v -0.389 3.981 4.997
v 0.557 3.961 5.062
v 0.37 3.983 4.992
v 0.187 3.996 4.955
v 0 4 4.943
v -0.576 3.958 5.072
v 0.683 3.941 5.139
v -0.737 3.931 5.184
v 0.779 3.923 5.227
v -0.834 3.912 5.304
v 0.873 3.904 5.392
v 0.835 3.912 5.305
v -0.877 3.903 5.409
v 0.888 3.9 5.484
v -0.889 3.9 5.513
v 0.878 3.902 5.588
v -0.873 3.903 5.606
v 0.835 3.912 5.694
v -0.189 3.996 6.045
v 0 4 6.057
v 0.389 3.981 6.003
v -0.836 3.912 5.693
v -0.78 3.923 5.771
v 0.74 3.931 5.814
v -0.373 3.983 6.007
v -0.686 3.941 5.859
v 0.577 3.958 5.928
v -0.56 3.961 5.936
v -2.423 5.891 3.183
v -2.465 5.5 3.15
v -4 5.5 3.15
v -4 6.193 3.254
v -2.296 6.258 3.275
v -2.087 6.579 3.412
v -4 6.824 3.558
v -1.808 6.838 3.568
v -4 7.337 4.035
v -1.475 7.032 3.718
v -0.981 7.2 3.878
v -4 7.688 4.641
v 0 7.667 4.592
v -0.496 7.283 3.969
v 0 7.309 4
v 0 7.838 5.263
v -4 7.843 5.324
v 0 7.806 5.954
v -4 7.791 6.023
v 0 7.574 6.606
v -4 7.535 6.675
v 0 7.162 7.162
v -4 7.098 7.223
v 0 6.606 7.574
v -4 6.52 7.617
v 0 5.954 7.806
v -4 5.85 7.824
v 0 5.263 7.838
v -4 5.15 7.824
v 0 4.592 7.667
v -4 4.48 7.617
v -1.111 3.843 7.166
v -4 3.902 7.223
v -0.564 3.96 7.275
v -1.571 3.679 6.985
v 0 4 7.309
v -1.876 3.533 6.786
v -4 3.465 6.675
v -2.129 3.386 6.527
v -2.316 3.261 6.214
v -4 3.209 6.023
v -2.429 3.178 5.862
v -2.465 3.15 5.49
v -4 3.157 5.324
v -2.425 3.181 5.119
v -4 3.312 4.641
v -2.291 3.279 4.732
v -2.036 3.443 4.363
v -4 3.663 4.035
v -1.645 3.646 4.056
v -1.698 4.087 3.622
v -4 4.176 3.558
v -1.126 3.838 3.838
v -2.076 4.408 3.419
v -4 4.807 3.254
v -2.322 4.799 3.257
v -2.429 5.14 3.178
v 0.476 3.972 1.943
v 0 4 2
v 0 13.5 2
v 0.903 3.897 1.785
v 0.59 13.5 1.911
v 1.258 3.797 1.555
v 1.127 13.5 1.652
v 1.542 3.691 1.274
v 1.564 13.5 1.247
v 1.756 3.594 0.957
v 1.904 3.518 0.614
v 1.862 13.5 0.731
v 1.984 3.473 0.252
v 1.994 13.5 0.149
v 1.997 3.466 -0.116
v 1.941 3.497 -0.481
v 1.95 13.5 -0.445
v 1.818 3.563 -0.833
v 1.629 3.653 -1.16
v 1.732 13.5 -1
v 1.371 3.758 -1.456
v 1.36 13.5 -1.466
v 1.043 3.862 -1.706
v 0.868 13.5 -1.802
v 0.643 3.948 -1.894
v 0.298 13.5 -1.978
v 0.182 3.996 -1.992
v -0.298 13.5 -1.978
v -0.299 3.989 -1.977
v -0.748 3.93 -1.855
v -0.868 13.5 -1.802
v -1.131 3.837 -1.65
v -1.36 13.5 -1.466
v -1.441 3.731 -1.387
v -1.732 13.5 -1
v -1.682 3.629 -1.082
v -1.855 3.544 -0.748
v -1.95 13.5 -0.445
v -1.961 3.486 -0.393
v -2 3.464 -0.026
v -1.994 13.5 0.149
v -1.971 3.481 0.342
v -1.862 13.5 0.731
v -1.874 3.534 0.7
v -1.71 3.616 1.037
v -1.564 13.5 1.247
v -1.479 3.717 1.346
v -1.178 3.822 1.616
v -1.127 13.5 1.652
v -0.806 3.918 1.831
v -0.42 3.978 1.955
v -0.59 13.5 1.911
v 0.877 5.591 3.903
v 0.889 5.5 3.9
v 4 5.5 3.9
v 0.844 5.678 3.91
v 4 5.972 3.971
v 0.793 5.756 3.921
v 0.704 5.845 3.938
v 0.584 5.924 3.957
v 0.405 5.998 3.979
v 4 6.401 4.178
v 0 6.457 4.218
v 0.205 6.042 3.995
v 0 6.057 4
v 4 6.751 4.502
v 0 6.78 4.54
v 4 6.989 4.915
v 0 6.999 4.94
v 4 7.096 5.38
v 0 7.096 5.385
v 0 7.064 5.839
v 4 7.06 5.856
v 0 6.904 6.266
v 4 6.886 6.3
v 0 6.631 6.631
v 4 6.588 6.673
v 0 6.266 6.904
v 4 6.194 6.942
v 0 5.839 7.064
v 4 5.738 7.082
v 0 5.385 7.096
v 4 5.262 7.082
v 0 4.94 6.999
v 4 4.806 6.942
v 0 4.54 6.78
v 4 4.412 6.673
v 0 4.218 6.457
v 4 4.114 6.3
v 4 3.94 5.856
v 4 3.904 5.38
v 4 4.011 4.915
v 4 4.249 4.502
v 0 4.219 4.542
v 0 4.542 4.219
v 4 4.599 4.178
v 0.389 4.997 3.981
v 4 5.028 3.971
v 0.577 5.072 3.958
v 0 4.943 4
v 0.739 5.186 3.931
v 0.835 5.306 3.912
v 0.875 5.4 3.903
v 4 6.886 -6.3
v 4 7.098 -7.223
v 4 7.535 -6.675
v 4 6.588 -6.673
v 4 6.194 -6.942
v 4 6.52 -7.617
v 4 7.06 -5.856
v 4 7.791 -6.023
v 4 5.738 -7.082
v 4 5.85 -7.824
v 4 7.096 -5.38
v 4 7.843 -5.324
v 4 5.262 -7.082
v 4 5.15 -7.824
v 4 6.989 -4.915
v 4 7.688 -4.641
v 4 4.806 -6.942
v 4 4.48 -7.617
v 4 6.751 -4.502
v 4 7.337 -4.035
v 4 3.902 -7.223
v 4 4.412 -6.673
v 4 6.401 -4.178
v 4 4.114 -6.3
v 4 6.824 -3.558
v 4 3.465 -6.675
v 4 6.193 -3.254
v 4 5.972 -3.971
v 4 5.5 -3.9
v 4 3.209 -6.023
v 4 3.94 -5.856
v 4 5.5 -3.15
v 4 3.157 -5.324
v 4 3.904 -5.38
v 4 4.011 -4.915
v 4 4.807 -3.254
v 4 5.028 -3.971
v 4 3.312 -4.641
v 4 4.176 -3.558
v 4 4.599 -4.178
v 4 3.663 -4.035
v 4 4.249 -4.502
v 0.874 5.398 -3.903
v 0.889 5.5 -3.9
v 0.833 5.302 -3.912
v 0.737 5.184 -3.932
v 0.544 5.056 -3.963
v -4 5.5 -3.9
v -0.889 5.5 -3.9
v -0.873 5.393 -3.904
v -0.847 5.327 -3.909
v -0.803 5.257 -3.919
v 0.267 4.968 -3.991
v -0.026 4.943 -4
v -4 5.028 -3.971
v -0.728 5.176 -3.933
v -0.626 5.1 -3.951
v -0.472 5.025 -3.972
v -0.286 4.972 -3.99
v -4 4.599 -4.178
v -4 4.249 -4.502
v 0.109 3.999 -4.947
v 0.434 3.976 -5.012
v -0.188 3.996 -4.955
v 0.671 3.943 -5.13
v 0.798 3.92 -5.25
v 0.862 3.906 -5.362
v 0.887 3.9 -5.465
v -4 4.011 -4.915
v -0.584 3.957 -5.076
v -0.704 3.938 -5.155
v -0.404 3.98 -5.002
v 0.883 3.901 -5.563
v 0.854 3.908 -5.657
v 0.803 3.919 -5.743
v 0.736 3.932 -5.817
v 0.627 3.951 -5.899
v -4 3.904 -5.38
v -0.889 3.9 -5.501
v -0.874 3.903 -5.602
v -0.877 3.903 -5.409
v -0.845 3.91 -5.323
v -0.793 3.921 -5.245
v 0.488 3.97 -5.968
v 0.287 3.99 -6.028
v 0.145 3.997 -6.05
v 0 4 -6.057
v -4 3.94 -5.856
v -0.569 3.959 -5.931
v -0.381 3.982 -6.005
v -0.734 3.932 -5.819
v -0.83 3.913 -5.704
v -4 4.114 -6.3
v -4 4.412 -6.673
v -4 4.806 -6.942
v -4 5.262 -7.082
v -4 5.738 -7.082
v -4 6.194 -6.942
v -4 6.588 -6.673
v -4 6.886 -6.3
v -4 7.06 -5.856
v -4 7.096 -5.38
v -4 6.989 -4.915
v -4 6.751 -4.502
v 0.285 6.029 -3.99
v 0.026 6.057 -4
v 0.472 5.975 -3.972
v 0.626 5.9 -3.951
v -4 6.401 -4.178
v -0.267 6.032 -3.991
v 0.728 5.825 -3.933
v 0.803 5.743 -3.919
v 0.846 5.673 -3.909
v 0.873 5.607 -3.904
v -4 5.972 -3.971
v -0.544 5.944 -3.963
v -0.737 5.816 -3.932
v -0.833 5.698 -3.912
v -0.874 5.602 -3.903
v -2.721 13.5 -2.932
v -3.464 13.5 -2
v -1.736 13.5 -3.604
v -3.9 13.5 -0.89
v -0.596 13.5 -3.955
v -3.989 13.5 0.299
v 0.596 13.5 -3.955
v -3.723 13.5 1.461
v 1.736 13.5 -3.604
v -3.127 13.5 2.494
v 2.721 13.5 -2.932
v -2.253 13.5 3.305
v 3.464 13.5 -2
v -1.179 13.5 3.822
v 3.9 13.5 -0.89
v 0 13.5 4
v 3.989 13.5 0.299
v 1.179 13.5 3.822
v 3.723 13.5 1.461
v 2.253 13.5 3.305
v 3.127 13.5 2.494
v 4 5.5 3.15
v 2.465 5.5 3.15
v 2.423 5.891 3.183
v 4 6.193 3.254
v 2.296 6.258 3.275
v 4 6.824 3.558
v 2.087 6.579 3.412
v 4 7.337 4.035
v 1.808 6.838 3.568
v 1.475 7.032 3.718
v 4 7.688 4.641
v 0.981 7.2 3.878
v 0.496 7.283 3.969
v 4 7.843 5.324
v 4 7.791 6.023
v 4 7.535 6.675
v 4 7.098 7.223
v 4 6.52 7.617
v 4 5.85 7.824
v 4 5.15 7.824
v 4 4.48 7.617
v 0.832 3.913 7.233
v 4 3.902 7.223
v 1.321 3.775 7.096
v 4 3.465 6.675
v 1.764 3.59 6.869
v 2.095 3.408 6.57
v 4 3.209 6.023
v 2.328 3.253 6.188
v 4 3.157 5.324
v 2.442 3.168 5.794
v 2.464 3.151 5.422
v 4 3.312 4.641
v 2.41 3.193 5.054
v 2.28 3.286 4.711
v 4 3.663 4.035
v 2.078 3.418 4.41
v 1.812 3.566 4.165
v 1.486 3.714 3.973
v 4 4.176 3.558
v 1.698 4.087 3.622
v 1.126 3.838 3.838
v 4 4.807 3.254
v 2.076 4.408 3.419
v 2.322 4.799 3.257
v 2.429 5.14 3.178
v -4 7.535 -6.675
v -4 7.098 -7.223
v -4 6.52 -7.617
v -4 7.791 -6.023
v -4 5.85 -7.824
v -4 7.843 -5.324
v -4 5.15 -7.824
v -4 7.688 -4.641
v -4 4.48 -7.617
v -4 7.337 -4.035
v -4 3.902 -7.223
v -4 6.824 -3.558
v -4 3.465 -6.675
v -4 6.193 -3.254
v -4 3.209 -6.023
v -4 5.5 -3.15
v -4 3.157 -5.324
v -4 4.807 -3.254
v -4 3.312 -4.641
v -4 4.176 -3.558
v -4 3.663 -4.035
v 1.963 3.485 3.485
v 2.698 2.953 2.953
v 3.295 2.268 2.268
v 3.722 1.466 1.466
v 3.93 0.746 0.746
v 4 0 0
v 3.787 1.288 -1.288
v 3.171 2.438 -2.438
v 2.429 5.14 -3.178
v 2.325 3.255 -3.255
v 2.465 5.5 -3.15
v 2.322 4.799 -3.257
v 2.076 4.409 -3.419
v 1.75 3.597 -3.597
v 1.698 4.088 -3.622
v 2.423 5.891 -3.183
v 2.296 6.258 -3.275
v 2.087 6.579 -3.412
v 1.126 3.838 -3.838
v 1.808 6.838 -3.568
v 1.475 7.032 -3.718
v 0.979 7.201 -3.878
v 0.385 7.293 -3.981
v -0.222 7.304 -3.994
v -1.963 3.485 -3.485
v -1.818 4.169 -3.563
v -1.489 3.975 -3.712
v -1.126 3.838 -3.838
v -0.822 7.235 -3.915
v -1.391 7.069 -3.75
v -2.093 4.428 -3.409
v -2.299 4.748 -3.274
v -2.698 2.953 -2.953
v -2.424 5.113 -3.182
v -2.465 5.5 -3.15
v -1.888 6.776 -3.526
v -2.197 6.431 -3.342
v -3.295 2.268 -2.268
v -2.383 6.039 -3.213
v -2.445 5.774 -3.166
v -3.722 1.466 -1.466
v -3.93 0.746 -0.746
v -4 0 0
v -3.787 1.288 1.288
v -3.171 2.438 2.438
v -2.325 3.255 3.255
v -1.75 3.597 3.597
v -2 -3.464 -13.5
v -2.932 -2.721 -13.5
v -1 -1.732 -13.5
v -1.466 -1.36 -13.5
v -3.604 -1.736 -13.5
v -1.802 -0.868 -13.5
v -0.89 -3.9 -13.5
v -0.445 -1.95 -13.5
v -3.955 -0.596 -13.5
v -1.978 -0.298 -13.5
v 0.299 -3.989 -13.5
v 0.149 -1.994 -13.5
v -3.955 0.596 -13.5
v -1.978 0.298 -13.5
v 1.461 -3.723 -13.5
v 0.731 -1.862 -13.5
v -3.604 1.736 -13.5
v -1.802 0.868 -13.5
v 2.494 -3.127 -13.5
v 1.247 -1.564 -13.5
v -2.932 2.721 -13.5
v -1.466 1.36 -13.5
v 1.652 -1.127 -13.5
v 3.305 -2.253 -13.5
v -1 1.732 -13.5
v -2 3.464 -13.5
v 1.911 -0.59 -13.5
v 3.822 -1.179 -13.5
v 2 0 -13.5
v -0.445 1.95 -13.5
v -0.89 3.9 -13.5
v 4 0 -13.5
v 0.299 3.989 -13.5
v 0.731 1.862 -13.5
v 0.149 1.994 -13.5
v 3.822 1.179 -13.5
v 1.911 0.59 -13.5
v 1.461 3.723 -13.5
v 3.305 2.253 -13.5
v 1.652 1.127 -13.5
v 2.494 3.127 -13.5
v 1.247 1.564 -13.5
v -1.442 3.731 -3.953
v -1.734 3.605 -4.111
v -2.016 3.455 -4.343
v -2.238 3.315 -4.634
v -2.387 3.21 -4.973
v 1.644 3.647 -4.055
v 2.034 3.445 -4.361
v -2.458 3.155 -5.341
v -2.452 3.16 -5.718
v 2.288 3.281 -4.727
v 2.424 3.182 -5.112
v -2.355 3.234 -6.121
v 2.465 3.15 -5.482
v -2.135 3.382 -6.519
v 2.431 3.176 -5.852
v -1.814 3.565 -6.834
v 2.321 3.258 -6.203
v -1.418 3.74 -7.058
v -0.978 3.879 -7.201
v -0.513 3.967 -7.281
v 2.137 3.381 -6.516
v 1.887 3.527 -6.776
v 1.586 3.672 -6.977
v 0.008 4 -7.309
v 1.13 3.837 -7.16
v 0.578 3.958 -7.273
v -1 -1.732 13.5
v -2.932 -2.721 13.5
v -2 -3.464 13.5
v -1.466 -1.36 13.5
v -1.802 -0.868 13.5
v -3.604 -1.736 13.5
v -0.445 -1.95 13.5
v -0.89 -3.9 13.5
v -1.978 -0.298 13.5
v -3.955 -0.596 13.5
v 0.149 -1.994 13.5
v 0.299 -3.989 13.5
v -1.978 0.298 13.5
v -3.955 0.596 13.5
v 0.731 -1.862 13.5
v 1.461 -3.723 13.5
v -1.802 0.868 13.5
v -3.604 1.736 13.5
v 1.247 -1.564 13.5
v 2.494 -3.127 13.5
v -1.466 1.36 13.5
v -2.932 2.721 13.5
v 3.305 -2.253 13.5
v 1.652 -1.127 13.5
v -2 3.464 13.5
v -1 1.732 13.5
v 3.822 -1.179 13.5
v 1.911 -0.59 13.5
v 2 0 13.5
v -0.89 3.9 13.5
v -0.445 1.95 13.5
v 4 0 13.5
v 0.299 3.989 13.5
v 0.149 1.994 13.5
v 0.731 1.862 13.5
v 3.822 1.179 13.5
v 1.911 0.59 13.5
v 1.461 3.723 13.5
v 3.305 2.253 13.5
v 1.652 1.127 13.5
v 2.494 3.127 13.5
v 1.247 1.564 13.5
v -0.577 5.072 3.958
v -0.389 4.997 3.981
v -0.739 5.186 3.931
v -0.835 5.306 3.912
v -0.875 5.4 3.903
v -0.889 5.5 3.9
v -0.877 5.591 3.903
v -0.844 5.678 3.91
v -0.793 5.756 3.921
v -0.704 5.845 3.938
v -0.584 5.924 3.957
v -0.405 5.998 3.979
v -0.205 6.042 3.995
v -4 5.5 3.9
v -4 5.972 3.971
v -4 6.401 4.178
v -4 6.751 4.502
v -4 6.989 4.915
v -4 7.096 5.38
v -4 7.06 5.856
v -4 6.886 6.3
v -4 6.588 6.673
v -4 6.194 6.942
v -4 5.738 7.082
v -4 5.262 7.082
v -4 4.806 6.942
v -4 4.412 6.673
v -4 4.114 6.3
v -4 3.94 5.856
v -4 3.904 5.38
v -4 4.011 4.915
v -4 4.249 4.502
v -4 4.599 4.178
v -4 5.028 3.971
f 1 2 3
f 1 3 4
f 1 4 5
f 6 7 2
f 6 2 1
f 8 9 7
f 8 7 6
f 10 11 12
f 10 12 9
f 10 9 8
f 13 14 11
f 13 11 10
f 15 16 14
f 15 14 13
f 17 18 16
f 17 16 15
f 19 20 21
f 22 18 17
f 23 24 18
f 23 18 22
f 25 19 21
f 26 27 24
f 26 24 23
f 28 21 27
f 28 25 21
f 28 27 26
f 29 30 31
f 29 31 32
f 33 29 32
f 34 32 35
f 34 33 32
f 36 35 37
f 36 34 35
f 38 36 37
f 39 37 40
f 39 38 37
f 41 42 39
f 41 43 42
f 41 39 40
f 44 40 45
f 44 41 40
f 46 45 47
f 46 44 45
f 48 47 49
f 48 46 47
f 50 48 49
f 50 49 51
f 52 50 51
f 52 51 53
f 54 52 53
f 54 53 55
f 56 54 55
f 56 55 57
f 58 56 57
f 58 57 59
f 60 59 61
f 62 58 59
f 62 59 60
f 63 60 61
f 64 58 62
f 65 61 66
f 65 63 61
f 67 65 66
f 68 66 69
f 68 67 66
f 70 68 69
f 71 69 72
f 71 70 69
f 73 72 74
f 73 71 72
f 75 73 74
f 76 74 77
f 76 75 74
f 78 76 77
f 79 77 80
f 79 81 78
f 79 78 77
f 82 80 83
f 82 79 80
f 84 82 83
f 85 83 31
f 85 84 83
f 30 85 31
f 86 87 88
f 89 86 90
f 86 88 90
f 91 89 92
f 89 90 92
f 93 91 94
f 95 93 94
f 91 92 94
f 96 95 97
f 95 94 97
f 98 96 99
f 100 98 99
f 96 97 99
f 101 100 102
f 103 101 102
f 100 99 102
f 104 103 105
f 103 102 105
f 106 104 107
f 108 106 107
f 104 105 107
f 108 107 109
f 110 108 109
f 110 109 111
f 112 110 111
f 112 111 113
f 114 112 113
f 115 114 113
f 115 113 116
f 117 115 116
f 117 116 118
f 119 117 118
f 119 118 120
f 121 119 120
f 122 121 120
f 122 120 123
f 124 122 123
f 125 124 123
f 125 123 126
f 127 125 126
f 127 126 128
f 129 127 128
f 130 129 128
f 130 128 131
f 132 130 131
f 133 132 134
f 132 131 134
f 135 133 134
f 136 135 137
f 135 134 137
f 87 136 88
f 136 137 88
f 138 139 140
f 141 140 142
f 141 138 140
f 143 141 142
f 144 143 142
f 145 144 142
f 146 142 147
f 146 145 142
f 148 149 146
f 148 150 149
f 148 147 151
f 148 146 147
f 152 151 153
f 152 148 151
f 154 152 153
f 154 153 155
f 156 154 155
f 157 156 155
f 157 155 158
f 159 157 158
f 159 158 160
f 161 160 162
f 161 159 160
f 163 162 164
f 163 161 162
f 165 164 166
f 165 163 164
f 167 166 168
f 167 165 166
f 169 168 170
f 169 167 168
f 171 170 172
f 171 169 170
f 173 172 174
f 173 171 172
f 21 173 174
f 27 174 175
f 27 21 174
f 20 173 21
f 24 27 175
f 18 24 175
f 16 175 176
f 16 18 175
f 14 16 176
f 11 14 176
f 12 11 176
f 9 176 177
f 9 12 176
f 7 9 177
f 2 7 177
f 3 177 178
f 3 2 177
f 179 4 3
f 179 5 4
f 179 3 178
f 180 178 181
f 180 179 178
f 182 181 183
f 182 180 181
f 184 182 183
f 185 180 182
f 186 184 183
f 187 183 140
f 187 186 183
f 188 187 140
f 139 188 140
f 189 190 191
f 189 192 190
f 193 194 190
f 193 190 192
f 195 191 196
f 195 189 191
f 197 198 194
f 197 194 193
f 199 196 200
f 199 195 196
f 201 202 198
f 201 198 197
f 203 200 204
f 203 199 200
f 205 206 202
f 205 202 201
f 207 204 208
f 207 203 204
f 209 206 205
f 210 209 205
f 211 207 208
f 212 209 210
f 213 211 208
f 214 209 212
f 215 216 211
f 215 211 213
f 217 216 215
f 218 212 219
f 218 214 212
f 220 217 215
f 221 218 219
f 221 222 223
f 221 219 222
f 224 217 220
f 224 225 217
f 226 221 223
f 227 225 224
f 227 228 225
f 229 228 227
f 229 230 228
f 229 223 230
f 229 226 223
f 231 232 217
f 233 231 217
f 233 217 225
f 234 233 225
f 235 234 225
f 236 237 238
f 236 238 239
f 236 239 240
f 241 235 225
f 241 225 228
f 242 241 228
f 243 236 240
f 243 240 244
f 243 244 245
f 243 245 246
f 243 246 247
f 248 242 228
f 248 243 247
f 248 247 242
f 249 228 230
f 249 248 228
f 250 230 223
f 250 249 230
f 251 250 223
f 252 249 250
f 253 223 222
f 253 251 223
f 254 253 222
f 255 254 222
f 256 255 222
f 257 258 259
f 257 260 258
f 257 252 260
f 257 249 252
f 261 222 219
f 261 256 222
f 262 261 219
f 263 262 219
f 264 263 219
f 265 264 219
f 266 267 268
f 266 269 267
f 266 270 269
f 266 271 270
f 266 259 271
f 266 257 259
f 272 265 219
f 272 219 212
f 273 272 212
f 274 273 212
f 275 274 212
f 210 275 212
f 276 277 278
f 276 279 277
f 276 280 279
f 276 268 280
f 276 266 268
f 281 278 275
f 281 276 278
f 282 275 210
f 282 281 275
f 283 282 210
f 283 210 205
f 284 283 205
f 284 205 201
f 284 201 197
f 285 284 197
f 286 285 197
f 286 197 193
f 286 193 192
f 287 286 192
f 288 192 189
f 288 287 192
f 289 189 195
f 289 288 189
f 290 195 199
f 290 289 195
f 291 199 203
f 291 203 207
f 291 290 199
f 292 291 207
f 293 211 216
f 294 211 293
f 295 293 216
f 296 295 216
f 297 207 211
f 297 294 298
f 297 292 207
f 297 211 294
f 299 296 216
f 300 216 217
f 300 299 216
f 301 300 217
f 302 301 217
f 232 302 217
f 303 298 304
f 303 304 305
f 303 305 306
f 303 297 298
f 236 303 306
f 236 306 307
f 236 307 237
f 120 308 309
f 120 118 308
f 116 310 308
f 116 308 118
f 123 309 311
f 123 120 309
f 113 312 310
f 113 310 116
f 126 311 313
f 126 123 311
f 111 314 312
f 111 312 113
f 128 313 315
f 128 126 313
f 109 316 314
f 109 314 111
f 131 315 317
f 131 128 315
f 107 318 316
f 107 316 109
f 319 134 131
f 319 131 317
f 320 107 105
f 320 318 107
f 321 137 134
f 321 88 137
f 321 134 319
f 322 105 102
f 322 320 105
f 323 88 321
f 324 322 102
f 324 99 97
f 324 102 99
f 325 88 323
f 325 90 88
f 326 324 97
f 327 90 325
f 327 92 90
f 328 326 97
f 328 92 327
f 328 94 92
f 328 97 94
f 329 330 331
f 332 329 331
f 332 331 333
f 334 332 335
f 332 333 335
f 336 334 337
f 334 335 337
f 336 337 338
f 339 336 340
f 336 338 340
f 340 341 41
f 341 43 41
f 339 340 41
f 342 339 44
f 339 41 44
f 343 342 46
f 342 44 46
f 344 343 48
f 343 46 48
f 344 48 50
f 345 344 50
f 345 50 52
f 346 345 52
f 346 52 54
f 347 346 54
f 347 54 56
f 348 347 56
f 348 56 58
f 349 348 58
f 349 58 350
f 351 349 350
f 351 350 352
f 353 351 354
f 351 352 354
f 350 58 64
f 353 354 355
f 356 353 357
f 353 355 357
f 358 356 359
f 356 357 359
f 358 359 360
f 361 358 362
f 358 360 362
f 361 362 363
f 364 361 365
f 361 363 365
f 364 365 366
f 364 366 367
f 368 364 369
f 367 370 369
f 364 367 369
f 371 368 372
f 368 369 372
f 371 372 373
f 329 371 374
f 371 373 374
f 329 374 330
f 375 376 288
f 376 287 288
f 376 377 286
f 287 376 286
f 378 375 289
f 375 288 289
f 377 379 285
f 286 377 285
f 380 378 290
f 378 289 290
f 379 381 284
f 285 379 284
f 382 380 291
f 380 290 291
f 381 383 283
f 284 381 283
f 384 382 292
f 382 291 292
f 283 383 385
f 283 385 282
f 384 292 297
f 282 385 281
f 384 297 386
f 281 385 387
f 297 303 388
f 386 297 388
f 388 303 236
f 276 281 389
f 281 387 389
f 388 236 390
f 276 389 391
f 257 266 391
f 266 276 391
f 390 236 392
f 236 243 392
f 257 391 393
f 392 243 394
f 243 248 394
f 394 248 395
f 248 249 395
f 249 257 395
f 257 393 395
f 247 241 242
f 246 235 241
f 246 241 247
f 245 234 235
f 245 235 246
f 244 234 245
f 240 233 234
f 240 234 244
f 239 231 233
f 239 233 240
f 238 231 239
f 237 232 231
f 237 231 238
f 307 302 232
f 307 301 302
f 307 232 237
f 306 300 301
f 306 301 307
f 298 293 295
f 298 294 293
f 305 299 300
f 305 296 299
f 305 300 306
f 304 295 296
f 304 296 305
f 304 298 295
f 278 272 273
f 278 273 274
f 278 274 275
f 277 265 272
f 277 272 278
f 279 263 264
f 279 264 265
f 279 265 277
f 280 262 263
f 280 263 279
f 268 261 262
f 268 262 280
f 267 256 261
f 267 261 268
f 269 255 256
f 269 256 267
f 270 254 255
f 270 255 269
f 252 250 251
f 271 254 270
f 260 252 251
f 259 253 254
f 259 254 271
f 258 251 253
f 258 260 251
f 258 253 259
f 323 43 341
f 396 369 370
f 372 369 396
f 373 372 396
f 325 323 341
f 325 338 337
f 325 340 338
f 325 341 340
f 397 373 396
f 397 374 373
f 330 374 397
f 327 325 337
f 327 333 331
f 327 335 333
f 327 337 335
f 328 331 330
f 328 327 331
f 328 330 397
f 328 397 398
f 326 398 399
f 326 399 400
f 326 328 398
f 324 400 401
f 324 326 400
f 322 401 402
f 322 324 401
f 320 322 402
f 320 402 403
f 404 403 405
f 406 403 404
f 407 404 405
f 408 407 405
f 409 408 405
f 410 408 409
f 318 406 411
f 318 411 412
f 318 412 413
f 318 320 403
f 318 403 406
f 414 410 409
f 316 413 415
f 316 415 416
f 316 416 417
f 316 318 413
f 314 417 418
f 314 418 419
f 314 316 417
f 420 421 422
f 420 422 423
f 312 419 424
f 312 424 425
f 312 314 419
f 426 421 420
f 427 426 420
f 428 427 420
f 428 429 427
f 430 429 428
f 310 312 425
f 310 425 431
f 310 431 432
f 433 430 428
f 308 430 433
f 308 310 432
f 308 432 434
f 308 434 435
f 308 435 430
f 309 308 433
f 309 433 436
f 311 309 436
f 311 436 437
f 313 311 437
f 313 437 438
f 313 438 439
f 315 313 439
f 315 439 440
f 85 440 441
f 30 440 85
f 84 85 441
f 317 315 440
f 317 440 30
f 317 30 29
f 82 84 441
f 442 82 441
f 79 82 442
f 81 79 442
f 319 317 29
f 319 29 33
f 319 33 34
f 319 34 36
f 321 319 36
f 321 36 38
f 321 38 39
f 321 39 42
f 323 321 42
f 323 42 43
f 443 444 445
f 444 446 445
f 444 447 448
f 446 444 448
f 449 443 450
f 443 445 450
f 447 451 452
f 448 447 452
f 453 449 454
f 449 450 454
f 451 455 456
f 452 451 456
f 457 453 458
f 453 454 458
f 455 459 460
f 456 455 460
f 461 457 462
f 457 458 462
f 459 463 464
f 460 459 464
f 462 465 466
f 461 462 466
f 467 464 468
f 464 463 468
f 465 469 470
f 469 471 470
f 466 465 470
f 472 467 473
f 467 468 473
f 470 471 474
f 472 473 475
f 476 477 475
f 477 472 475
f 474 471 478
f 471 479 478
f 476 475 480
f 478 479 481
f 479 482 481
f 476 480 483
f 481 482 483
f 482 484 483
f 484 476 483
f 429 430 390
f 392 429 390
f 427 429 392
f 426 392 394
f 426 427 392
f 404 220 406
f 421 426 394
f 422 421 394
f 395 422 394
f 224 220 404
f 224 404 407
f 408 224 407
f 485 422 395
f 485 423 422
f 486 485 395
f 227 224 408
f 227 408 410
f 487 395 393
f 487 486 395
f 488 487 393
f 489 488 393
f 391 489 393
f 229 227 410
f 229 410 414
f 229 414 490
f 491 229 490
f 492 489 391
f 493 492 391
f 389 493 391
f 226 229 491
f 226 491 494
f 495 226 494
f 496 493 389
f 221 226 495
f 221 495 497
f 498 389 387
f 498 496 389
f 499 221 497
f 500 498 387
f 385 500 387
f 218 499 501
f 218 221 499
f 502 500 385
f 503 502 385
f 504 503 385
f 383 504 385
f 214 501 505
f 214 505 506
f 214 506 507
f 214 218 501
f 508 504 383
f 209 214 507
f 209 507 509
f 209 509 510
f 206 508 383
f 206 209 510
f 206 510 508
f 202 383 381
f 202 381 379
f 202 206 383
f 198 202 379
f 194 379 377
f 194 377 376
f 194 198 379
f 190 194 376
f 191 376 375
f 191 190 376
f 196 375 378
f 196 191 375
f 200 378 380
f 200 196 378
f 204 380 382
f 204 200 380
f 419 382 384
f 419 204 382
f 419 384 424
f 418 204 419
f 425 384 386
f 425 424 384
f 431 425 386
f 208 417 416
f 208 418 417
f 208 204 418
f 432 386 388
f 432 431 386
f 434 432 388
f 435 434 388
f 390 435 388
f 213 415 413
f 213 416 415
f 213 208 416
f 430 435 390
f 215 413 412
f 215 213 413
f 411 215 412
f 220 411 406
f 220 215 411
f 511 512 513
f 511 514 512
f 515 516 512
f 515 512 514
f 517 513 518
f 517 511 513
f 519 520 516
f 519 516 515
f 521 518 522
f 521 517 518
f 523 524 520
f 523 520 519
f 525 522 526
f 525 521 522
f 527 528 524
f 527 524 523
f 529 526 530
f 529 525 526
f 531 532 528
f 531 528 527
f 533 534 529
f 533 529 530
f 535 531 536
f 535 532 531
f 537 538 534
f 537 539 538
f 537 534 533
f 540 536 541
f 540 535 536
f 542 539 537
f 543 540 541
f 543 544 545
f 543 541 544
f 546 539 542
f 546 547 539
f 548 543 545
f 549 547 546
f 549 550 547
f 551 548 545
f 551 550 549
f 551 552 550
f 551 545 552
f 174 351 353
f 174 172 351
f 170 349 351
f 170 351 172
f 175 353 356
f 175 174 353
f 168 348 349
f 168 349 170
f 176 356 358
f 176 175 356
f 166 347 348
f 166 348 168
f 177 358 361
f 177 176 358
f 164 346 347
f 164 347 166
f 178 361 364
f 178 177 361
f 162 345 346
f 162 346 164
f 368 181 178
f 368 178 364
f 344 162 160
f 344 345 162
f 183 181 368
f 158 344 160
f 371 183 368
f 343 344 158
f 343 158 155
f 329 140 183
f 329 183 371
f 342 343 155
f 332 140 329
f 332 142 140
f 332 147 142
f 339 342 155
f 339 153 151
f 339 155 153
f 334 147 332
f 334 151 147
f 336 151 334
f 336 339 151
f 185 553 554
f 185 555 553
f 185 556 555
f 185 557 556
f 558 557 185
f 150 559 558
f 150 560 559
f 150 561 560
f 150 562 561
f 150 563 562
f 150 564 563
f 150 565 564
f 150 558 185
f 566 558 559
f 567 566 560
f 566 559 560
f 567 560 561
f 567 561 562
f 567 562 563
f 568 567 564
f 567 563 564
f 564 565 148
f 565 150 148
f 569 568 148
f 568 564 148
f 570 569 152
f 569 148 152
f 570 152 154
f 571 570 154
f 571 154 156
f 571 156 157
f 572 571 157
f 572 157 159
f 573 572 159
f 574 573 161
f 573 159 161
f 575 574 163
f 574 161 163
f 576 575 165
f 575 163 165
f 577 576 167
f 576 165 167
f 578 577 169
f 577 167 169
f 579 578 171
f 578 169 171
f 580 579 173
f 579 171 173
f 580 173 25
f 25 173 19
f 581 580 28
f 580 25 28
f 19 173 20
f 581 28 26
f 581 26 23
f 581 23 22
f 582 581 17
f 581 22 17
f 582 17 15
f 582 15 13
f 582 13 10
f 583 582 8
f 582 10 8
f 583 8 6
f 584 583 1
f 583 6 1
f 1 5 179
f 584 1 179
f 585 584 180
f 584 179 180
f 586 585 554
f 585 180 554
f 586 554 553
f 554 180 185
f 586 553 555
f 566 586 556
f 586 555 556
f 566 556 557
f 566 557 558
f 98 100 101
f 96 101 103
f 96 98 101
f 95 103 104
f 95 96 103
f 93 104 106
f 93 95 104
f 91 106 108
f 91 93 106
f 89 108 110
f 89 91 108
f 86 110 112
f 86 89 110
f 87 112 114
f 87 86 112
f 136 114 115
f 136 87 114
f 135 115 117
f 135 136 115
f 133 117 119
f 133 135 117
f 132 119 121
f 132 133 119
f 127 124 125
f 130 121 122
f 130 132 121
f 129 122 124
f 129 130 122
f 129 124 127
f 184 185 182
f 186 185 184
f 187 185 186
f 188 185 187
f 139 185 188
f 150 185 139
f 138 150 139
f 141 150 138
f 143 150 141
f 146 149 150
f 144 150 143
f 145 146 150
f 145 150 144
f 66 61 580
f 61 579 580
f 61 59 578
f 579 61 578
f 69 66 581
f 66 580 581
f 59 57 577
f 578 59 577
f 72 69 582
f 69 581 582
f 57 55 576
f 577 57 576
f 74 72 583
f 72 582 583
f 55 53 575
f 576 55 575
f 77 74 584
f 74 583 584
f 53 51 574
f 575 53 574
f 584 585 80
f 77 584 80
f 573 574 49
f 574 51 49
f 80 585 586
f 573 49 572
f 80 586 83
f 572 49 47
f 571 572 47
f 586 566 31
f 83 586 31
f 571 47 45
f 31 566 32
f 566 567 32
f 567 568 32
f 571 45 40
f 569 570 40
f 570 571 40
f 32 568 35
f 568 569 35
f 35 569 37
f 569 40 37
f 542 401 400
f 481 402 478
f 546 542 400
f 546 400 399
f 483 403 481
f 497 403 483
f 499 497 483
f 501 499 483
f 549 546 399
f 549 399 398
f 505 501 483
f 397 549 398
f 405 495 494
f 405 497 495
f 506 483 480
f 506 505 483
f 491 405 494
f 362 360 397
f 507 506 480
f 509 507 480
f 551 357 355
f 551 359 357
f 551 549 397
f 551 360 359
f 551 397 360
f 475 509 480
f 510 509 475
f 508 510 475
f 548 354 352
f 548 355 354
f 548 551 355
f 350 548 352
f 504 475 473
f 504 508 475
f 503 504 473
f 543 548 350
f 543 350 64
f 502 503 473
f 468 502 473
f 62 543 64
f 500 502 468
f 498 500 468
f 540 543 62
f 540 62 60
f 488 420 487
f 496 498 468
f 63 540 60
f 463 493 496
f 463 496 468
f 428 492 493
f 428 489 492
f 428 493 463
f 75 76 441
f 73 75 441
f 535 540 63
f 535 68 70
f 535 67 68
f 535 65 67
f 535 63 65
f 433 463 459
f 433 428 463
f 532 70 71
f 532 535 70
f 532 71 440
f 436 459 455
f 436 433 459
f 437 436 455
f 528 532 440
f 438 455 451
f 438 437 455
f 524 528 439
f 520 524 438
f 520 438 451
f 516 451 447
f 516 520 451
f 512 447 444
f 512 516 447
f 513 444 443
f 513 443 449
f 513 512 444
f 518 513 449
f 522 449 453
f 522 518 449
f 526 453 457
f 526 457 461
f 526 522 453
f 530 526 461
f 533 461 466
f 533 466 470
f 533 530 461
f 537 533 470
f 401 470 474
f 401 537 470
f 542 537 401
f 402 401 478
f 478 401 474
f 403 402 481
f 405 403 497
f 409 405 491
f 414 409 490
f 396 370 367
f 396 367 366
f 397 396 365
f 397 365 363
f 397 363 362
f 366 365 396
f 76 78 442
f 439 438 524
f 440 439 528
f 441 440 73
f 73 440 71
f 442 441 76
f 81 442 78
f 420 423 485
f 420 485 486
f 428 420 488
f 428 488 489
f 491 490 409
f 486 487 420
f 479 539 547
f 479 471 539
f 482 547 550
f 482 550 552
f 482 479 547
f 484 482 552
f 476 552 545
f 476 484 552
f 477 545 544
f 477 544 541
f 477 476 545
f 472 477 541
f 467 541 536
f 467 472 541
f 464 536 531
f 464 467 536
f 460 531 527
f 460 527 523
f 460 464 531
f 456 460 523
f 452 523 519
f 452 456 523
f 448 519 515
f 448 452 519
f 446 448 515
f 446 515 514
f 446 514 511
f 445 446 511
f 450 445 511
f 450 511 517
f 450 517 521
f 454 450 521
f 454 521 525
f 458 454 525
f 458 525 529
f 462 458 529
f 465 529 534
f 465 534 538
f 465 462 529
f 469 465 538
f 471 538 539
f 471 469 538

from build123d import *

# Parameters (mm, degrees)
ESQUISSE1_R             = 4
ESQUISSE1_R_2           = 2
BOSS_EXTRU_1_DEPTH      = 13.5
BOSS_EXTRU_2_REACH      = 30.137
BOSS_EXTRU_2_END_RADIUS = 4
BOSS_EXTRU_2_START      = 13.5
ESQUISSE2_R             = 4
ESQUISSE2_R_2           = 2
ESQUISSE3_R             = 2.35
ESQUISSE3_R_2           = 1.6
BOSS_EXTRU_3_DEPTH      = 4


with BuildPart() as part:
    # Esquisse1 → Boss.-Extru.1 (new, symmetric)
    with BuildSketch(Plane.XY):
        Circle(ESQUISSE1_R)
        Circle(ESQUISSE1_R_2, mode=Mode.SUBTRACT)
    extrude(amount=BOSS_EXTRU_1_DEPTH, both=True)

    # Boss.-Extru.2: up to this cylinder (the profile starts outside it)
    boss_extru_2_end = Plane(origin=(0, 0, -3.886863), z_dir=(0, 0, -1)) * Cylinder(BOSS_EXTRU_2_END_RADIUS, 69.274, mode=Mode.PRIVATE)
    # Esquisse2 → Boss.-Extru.2 (add, up to the surface)
    with BuildSketch(Plane(origin=(0, 0, 0), x_dir=(1, 0, 0), z_dir=(0, 1, 0)).offset(BOSS_EXTRU_2_START), mode=Mode.PRIVATE) as boss_extru_2_sk1:
        with Locations(Location((0, 0, 0), (0, 0, 270))):
            Circle(ESQUISSE2_R)
        with Locations(Location((0, 0, 0), (0, 0, 270))):
            Circle(ESQUISSE2_R_2, mode=Mode.SUBTRACT)
    boss_extru_2_tool1 = extrude(boss_extru_2_sk1.sketch, amount=-BOSS_EXTRU_2_REACH, mode=Mode.PRIVATE) - boss_extru_2_end
    add(boss_extru_2_tool1.solids().sort_by_distance((0, 13.5, -3.886863))[0])

    # Esquisse3 → Boss.-Extru.3 (add, symmetric)
    # profile 1 of 2: a face of its own
    with BuildSketch(Plane(origin=(0, 0, 0), x_dir=(0, 0, -1), z_dir=(1, 0, 0))):
        with Locations((-5.5, 5.5)):
            Circle(ESQUISSE3_R)
        with Locations((-5.5, 5.5)):
            Circle(ESQUISSE3_R_2, mode=Mode.SUBTRACT)
    # profile 2 of 2: a face of its own
    with BuildSketch(Plane(origin=(0, 0, 0), x_dir=(0, 0, -1), z_dir=(1, 0, 0))):
        with Locations(Location((5.5, 5.5, 0), (0, 0, 180))):
            Circle(ESQUISSE3_R)
        with Locations(Location((5.5, 5.5, 0), (0, 0, 180))):
            Circle(ESQUISSE3_R_2, mode=Mode.SUBTRACT)
    extrude(amount=BOSS_EXTRU_3_DEPTH, both=True)


solid = part.part
